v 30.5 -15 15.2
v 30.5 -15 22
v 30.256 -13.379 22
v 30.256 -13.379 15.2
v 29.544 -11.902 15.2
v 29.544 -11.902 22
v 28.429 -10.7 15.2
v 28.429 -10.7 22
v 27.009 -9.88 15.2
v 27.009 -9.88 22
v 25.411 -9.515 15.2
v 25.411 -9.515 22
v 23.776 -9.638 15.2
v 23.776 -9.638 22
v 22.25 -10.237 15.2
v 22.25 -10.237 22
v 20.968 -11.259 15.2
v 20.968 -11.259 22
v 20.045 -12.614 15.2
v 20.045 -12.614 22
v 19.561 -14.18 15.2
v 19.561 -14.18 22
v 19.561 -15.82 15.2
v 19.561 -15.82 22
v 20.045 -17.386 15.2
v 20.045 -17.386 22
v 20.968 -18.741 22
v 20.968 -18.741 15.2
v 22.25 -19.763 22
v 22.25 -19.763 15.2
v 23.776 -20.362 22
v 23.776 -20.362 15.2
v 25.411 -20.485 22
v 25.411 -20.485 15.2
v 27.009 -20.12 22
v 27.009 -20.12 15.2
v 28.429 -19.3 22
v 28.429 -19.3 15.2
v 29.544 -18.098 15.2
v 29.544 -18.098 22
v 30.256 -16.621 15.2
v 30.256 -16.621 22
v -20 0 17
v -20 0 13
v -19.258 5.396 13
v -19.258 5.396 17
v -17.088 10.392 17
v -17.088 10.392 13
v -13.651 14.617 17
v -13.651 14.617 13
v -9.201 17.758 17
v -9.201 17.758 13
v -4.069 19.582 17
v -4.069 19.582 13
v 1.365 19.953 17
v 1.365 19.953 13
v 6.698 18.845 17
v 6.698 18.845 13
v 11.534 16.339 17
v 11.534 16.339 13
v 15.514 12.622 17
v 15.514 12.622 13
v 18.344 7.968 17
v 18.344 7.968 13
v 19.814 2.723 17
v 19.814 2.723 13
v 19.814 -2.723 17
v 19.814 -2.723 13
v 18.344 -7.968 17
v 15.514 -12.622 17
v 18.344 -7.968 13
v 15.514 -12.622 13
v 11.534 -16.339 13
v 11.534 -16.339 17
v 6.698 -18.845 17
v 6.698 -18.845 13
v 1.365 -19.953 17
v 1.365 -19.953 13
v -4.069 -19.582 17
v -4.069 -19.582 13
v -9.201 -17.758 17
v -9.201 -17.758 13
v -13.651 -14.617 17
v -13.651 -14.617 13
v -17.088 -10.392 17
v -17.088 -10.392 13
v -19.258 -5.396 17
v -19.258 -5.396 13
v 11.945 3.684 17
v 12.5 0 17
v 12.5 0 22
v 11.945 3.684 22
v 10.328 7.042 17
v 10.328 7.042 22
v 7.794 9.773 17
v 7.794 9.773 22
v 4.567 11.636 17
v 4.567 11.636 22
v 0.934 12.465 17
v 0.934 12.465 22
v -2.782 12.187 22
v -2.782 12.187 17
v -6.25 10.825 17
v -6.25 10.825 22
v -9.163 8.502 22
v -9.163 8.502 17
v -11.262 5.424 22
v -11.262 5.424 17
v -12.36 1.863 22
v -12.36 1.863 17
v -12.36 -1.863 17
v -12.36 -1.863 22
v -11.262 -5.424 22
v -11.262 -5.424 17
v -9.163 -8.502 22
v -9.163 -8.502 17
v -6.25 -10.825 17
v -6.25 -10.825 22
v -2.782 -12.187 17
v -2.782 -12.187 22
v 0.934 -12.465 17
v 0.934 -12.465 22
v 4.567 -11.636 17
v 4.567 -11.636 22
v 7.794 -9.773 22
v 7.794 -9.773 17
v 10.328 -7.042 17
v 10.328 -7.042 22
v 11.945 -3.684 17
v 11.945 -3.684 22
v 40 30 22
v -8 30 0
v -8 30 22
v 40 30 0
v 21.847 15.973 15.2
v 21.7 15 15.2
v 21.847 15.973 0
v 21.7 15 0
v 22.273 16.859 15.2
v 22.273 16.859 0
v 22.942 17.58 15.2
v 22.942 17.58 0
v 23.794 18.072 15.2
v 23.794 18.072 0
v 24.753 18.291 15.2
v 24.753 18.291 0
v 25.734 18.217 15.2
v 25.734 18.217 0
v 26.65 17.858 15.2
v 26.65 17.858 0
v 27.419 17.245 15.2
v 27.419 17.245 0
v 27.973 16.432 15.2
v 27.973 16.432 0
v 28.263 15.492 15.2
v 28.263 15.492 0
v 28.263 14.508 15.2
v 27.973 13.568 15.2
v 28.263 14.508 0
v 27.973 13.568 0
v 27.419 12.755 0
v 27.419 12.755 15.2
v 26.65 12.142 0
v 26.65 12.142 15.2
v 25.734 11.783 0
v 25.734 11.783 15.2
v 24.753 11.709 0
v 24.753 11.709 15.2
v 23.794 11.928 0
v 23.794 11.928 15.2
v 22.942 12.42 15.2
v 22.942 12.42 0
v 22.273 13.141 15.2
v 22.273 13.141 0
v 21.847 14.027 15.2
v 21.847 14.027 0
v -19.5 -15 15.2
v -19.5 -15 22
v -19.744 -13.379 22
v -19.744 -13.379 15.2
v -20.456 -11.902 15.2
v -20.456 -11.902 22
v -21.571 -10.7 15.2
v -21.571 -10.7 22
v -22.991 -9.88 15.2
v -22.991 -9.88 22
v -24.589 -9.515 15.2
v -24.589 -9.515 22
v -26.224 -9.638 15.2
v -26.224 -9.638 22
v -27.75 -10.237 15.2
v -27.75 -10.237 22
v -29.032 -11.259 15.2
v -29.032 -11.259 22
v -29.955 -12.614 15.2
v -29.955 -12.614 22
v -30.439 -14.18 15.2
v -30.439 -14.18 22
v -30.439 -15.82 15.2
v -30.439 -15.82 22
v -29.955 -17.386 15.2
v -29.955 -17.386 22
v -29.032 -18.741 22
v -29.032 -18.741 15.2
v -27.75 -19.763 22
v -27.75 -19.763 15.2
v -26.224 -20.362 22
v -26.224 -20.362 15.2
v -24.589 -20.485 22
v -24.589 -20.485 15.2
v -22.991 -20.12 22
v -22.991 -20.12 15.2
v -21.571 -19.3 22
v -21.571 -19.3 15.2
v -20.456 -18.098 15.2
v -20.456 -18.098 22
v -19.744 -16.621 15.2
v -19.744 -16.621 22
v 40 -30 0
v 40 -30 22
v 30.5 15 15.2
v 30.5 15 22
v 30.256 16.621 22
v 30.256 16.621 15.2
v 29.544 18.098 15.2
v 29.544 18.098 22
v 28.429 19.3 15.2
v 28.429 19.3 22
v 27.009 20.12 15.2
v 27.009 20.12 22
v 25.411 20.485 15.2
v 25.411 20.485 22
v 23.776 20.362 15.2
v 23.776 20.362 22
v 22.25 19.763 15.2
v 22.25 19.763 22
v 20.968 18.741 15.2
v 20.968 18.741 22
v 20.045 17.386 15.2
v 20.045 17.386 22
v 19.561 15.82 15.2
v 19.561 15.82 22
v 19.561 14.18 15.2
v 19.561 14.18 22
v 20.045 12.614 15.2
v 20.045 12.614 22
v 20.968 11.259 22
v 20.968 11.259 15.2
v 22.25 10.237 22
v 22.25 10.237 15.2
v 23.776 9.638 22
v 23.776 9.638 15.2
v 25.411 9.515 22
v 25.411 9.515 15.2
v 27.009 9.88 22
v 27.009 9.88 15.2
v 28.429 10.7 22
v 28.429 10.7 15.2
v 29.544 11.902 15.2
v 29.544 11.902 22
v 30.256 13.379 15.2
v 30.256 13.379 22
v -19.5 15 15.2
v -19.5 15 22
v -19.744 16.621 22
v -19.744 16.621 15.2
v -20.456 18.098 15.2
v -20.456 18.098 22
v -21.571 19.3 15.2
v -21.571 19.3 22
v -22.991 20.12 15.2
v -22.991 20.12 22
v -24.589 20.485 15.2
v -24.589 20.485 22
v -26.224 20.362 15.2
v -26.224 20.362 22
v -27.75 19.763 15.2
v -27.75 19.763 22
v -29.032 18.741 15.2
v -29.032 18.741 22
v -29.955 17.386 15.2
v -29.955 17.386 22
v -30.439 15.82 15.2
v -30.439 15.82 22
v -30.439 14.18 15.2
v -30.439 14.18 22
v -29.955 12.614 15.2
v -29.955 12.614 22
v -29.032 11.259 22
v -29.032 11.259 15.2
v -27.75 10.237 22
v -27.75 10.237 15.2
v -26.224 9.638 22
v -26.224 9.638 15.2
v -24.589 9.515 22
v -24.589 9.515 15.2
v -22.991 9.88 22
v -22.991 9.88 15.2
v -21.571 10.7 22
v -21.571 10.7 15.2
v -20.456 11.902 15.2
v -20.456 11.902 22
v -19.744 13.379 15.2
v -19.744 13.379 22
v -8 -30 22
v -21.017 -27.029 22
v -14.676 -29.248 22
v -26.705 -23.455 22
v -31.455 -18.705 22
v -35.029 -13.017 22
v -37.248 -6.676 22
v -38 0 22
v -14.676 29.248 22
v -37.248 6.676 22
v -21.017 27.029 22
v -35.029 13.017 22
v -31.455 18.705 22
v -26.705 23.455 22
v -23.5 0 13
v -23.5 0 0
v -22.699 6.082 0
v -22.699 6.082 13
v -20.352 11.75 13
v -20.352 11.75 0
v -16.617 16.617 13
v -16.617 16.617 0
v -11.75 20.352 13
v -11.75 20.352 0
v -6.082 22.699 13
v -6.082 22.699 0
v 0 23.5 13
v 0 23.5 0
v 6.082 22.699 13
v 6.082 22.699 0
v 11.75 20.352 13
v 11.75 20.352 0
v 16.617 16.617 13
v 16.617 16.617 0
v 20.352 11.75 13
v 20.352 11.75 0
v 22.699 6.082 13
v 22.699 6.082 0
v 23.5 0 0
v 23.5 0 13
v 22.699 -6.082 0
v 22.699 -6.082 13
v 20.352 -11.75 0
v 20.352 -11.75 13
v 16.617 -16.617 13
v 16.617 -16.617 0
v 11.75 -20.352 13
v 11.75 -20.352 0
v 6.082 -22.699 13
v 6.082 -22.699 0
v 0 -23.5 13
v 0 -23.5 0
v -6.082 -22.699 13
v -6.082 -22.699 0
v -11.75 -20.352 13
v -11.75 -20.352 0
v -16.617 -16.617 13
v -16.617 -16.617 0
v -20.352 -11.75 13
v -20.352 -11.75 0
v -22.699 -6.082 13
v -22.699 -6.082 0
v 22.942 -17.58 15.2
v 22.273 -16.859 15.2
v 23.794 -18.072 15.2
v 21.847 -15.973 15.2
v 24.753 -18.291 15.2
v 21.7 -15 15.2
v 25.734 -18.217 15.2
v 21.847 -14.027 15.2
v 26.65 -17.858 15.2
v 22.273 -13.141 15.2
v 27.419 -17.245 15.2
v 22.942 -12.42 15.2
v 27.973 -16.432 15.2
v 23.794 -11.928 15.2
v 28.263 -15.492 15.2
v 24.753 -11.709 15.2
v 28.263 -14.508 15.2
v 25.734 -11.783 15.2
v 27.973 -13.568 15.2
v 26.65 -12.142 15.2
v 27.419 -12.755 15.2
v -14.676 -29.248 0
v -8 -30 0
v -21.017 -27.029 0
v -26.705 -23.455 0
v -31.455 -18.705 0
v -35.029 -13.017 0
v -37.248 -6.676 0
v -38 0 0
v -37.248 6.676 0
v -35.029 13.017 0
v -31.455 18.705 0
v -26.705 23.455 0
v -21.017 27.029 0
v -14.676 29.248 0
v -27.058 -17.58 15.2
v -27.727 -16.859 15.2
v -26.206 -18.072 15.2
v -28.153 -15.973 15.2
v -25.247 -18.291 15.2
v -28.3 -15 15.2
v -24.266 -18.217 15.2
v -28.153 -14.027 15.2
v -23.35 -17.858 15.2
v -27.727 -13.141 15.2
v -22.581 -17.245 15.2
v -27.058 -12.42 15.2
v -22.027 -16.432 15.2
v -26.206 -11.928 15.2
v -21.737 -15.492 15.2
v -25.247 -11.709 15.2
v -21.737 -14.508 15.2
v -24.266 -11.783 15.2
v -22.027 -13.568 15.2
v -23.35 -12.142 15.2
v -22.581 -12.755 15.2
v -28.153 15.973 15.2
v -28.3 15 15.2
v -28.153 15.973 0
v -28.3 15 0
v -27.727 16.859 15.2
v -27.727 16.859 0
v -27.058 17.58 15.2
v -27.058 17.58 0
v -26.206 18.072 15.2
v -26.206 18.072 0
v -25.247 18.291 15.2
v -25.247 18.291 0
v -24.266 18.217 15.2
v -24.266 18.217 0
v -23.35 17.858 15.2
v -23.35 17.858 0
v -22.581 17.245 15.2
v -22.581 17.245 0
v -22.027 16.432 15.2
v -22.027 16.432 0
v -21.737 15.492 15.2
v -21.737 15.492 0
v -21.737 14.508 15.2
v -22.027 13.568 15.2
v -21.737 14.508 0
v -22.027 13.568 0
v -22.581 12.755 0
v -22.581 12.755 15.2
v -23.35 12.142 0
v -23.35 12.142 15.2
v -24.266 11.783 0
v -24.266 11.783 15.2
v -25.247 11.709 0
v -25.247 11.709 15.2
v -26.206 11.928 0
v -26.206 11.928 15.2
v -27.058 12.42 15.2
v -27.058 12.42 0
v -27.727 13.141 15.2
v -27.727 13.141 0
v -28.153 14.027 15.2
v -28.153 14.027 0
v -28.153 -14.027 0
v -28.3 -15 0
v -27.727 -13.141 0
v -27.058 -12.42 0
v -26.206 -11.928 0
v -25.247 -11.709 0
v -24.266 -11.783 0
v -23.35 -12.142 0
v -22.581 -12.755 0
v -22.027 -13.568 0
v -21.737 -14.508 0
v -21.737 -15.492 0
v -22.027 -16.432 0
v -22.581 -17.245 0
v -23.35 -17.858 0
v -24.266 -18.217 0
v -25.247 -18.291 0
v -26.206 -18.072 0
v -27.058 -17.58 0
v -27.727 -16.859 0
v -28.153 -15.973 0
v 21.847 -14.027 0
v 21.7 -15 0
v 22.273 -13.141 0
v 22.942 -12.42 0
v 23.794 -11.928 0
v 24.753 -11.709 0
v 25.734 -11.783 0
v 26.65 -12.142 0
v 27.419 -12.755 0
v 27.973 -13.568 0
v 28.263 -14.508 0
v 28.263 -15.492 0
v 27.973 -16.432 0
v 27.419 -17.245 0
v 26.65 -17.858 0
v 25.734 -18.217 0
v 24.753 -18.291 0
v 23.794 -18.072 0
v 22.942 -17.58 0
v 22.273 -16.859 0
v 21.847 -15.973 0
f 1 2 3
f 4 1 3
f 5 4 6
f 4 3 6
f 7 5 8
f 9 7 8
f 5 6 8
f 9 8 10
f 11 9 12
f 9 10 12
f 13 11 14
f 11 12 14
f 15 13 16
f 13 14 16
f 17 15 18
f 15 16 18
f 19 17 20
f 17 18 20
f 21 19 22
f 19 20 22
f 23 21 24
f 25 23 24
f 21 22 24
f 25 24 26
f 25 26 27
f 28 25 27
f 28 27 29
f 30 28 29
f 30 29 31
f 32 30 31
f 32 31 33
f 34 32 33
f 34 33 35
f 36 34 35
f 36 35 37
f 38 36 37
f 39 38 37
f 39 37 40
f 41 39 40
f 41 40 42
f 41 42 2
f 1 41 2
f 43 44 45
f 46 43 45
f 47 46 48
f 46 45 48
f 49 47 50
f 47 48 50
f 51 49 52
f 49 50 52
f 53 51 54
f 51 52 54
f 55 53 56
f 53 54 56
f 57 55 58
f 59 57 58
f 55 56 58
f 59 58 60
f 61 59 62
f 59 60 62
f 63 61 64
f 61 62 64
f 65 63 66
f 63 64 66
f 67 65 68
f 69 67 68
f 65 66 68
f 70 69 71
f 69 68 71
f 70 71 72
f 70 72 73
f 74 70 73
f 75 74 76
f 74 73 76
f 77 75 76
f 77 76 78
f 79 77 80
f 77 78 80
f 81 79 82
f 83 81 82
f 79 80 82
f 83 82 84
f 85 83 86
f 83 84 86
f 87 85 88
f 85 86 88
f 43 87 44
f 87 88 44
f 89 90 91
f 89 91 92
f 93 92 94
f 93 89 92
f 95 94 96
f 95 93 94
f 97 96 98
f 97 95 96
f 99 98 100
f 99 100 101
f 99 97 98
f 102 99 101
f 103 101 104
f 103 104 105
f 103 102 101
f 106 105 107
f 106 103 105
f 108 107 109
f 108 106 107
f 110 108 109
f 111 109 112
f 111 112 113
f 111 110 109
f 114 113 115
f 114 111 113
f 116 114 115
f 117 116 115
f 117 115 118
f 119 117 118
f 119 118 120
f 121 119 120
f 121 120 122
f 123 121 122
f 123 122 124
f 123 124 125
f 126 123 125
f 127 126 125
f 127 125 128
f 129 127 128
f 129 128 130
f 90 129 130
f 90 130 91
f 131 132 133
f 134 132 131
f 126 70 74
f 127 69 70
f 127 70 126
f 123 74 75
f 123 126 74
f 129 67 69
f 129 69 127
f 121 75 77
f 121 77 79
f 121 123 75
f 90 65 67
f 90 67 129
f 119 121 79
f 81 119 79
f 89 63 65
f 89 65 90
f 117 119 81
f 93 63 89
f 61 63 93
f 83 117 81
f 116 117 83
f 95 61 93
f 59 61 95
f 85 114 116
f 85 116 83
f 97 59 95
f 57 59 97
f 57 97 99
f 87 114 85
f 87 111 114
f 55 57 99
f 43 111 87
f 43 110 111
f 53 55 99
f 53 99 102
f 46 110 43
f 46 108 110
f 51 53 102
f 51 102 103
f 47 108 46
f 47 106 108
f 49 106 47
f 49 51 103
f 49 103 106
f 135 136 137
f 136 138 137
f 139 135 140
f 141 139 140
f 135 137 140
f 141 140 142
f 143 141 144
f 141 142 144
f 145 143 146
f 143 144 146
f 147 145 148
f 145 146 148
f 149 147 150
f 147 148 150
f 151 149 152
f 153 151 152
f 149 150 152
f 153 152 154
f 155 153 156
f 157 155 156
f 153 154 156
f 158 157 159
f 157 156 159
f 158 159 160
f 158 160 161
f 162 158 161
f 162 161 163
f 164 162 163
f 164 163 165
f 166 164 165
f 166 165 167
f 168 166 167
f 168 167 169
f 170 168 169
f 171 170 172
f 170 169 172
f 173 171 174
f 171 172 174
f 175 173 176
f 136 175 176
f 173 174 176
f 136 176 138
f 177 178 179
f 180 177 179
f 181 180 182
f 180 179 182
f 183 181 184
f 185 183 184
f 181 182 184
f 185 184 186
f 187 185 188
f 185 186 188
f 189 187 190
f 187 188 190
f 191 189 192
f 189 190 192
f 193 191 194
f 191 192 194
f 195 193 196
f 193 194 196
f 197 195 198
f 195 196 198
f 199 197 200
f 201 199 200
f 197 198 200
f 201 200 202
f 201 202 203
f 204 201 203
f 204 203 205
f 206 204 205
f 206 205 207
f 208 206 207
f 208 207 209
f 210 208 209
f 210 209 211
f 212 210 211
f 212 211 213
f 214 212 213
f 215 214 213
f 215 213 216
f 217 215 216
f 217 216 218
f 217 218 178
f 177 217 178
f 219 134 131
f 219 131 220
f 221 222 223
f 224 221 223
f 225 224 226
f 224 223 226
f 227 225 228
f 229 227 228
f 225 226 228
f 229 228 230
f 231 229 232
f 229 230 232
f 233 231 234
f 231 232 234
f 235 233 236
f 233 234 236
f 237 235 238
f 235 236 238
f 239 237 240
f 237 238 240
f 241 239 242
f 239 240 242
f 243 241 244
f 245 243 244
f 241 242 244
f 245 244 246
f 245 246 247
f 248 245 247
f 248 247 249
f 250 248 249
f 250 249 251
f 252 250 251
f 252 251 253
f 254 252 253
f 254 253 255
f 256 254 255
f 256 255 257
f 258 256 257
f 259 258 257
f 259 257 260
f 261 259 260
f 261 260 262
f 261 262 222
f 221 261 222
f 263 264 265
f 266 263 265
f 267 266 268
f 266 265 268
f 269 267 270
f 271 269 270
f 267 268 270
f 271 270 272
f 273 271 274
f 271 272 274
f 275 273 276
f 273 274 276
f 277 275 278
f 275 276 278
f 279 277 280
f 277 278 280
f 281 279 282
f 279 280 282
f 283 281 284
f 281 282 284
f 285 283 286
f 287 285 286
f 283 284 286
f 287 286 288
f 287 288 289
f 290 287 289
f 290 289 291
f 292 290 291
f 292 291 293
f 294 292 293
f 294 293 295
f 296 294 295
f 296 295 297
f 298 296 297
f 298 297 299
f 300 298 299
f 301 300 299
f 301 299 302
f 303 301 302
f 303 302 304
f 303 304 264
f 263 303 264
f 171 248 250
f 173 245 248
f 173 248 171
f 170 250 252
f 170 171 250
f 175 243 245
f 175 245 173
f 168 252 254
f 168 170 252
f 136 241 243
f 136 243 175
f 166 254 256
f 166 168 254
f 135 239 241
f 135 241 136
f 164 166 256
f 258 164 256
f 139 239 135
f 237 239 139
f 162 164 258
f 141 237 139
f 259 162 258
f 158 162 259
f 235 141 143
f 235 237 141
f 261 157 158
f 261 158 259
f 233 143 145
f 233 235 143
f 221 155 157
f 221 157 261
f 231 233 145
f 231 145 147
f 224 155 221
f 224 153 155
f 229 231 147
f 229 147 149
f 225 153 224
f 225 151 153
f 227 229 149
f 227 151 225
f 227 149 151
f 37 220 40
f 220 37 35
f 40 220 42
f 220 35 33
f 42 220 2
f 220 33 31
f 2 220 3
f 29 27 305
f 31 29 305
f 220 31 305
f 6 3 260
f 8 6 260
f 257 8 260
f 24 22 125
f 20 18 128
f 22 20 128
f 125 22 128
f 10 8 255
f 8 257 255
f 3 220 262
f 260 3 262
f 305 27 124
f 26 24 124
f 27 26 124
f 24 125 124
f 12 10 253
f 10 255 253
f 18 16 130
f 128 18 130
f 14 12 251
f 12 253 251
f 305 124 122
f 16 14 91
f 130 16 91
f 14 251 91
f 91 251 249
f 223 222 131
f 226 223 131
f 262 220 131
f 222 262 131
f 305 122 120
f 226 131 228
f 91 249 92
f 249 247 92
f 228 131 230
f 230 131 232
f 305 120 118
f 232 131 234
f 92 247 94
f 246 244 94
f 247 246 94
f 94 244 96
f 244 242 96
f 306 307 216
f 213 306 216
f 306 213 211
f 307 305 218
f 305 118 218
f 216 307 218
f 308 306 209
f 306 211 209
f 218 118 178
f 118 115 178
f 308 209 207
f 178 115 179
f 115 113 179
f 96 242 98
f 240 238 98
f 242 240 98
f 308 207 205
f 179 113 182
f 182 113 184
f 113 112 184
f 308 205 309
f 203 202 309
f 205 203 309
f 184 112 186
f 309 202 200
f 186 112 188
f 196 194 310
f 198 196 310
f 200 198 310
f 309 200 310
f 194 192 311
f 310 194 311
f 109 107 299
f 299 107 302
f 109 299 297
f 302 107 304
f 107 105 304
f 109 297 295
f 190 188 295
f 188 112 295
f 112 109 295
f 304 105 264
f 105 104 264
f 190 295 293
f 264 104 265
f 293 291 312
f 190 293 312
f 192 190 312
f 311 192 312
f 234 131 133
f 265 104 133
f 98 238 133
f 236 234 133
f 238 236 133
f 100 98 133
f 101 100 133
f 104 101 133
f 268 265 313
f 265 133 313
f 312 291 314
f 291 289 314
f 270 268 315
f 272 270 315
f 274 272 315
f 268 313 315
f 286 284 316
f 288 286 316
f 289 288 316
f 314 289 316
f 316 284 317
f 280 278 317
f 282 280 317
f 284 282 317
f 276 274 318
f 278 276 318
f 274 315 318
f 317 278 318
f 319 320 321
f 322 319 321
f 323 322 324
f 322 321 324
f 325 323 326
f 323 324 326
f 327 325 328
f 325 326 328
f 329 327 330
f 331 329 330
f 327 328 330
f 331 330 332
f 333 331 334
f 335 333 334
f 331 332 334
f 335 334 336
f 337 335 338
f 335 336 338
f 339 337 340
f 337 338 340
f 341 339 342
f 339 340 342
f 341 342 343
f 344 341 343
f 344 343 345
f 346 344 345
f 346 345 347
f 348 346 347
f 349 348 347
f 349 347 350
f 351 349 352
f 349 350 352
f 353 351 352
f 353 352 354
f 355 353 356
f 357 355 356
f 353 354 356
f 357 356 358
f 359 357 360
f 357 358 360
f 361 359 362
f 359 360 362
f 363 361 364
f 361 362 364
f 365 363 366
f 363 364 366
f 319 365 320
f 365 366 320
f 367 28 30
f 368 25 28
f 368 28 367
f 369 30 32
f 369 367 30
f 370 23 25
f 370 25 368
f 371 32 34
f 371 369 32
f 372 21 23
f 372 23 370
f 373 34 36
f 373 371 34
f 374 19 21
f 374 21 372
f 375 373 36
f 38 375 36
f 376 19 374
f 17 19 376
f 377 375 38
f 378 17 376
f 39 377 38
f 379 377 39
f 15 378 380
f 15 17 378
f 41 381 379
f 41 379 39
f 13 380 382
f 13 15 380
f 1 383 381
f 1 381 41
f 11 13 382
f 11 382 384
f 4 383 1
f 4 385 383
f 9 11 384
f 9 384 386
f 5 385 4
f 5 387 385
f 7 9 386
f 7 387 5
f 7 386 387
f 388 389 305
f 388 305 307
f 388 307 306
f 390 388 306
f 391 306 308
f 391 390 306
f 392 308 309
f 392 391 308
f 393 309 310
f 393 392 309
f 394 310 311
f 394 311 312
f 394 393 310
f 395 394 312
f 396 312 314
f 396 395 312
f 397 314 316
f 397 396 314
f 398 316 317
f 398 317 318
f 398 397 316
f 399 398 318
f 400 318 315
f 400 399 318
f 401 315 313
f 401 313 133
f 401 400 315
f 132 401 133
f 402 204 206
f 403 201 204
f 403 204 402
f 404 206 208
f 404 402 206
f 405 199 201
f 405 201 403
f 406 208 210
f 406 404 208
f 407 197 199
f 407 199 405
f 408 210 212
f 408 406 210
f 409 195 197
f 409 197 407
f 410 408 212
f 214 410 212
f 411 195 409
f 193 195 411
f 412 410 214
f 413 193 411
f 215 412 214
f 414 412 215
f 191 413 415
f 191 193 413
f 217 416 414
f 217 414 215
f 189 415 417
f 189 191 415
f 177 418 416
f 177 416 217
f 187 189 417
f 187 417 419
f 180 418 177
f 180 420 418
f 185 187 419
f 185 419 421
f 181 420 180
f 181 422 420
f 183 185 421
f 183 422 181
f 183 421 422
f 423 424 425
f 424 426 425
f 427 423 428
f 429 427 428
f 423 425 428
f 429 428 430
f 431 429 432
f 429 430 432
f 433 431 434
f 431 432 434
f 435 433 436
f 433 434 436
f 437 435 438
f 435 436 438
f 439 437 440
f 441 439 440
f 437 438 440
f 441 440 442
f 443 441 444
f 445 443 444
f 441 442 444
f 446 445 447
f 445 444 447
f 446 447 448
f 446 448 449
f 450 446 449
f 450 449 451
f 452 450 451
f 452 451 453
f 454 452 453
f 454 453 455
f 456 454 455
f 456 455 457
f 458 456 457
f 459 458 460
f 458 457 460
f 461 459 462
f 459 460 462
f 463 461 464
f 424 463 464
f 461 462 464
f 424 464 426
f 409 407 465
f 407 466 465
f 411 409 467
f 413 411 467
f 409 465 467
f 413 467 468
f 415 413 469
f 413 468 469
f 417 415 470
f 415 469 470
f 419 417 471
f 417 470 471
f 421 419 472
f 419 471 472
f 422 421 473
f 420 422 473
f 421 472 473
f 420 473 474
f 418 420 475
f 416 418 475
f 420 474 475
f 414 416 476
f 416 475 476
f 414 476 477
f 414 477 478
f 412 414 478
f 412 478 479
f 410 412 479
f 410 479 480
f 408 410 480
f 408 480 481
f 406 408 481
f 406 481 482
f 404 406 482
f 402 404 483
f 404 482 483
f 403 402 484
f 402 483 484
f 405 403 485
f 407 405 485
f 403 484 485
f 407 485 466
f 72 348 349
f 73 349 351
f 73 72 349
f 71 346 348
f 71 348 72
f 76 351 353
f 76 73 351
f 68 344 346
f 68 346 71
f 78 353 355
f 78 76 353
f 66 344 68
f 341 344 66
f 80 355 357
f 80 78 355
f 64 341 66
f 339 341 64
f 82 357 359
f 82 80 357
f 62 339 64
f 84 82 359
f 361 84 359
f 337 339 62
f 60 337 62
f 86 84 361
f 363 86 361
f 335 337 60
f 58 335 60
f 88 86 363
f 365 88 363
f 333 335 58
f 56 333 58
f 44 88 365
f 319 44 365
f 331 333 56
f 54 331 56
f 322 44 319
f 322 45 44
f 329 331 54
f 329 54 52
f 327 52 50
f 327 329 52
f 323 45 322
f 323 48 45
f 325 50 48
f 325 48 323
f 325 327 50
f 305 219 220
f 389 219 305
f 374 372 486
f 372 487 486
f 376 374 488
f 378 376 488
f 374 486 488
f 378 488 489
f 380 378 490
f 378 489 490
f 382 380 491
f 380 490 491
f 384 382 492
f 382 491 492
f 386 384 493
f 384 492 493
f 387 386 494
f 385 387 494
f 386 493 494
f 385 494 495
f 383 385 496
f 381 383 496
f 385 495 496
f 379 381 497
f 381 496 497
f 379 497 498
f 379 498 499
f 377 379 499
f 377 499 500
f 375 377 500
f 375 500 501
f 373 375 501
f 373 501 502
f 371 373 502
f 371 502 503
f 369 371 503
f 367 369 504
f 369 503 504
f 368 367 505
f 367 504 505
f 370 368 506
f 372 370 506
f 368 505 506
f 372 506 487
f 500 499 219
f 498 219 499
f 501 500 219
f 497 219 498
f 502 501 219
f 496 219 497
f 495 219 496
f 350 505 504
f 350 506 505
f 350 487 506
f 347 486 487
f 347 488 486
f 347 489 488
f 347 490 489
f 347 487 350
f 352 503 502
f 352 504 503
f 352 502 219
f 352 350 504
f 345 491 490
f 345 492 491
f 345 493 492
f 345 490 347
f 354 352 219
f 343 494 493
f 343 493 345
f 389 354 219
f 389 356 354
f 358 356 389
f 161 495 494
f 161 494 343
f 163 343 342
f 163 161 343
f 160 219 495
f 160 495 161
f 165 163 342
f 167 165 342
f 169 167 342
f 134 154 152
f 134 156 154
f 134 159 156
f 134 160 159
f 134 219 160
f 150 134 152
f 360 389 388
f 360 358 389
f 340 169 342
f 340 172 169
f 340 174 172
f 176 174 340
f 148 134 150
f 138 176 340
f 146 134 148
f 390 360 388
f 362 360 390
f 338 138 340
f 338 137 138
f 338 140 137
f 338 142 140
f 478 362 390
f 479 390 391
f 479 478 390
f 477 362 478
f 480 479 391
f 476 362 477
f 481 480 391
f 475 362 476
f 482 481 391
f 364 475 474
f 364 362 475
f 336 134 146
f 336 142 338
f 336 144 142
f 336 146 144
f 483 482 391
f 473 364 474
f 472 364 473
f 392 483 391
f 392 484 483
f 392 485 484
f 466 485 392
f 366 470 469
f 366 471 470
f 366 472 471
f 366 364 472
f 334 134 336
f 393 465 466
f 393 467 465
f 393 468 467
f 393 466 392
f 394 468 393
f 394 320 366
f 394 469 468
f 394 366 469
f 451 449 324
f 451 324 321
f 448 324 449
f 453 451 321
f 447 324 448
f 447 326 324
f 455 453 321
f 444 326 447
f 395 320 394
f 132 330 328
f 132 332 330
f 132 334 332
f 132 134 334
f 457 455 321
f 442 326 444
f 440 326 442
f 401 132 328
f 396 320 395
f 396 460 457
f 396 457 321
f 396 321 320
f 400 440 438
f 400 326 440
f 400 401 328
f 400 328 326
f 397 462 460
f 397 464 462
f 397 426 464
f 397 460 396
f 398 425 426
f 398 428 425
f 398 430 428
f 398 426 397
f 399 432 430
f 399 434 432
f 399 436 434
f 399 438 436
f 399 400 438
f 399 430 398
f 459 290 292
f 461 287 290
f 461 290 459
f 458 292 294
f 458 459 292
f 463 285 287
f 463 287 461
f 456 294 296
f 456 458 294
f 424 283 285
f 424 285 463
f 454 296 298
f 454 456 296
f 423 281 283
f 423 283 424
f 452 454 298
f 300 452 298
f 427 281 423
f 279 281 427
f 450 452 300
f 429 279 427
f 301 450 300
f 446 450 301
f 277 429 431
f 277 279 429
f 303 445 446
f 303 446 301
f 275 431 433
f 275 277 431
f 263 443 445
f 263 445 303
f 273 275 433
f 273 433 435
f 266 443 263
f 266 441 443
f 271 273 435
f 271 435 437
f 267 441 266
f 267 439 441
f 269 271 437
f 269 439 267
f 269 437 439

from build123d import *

# Parameters (mm, degrees)
SKETCH_1_R                = 12.5
EXTRUDE_1_DEPTH           = 22
HOLE_WIZARD_1_D           = 6.6
HOLE_WIZARD_1_CBORE_D     = 11
HOLE_WIZARD_1_CBORE_DEPTH = 6.8
SKETCH_5_R                = 23.5
CUT_EXTRUDE_1_DEPTH       = 13
SKETCH_6_R                = 20
CUT_EXTRUDE_2_DEPTH       = 4


with BuildPart() as part:
    # 草图1 → 凸台-拉伸1 (new body)
    with BuildSketch(Plane.XY):
        with BuildLine():
            Line((-8, 30), (40, 30))
            Line((40, 30), (40, -30))
            Line((40, -30), (-8, -30))
            ThreePointArc((-8, -30), (-38, 0), (-8, 30))
        make_face()
        Circle(SKETCH_1_R, mode=Mode.SUBTRACT)
    extrude(amount=EXTRUDE_1_DEPTH)

    # 打孔尺寸(%根据)内六角圆柱头螺钉的类型1 (through all)
    with Locations(Plane(origin=(-25, 15, 22), x_dir=(1, 0, 0), z_dir=(0, 0, 1))):
        with Locations((0, 0), (0, -30), (50, 0), (50, -30)):
            CounterBoreHole(HOLE_WIZARD_1_D / 2, HOLE_WIZARD_1_CBORE_D / 2, HOLE_WIZARD_1_CBORE_DEPTH)

    # 草图5 → 切除-拉伸1 (cut)
    with BuildSketch(Plane(origin=(0, 0, 0), x_dir=(-1, 0, 0), z_dir=(0, 0, -1))):
        Circle(SKETCH_5_R)
    extrude(amount=-CUT_EXTRUDE_1_DEPTH, mode=Mode.SUBTRACT)

    # 草图6 → 切除-拉伸2 (cut)
    with BuildSketch(Plane(origin=(0, 0, 13), x_dir=(-1, 0, 0), z_dir=(0, 0, -1))):
        Circle(SKETCH_6_R)
    extrude(amount=-CUT_EXTRUDE_2_DEPTH, mode=Mode.SUBTRACT)


solid = part.part
